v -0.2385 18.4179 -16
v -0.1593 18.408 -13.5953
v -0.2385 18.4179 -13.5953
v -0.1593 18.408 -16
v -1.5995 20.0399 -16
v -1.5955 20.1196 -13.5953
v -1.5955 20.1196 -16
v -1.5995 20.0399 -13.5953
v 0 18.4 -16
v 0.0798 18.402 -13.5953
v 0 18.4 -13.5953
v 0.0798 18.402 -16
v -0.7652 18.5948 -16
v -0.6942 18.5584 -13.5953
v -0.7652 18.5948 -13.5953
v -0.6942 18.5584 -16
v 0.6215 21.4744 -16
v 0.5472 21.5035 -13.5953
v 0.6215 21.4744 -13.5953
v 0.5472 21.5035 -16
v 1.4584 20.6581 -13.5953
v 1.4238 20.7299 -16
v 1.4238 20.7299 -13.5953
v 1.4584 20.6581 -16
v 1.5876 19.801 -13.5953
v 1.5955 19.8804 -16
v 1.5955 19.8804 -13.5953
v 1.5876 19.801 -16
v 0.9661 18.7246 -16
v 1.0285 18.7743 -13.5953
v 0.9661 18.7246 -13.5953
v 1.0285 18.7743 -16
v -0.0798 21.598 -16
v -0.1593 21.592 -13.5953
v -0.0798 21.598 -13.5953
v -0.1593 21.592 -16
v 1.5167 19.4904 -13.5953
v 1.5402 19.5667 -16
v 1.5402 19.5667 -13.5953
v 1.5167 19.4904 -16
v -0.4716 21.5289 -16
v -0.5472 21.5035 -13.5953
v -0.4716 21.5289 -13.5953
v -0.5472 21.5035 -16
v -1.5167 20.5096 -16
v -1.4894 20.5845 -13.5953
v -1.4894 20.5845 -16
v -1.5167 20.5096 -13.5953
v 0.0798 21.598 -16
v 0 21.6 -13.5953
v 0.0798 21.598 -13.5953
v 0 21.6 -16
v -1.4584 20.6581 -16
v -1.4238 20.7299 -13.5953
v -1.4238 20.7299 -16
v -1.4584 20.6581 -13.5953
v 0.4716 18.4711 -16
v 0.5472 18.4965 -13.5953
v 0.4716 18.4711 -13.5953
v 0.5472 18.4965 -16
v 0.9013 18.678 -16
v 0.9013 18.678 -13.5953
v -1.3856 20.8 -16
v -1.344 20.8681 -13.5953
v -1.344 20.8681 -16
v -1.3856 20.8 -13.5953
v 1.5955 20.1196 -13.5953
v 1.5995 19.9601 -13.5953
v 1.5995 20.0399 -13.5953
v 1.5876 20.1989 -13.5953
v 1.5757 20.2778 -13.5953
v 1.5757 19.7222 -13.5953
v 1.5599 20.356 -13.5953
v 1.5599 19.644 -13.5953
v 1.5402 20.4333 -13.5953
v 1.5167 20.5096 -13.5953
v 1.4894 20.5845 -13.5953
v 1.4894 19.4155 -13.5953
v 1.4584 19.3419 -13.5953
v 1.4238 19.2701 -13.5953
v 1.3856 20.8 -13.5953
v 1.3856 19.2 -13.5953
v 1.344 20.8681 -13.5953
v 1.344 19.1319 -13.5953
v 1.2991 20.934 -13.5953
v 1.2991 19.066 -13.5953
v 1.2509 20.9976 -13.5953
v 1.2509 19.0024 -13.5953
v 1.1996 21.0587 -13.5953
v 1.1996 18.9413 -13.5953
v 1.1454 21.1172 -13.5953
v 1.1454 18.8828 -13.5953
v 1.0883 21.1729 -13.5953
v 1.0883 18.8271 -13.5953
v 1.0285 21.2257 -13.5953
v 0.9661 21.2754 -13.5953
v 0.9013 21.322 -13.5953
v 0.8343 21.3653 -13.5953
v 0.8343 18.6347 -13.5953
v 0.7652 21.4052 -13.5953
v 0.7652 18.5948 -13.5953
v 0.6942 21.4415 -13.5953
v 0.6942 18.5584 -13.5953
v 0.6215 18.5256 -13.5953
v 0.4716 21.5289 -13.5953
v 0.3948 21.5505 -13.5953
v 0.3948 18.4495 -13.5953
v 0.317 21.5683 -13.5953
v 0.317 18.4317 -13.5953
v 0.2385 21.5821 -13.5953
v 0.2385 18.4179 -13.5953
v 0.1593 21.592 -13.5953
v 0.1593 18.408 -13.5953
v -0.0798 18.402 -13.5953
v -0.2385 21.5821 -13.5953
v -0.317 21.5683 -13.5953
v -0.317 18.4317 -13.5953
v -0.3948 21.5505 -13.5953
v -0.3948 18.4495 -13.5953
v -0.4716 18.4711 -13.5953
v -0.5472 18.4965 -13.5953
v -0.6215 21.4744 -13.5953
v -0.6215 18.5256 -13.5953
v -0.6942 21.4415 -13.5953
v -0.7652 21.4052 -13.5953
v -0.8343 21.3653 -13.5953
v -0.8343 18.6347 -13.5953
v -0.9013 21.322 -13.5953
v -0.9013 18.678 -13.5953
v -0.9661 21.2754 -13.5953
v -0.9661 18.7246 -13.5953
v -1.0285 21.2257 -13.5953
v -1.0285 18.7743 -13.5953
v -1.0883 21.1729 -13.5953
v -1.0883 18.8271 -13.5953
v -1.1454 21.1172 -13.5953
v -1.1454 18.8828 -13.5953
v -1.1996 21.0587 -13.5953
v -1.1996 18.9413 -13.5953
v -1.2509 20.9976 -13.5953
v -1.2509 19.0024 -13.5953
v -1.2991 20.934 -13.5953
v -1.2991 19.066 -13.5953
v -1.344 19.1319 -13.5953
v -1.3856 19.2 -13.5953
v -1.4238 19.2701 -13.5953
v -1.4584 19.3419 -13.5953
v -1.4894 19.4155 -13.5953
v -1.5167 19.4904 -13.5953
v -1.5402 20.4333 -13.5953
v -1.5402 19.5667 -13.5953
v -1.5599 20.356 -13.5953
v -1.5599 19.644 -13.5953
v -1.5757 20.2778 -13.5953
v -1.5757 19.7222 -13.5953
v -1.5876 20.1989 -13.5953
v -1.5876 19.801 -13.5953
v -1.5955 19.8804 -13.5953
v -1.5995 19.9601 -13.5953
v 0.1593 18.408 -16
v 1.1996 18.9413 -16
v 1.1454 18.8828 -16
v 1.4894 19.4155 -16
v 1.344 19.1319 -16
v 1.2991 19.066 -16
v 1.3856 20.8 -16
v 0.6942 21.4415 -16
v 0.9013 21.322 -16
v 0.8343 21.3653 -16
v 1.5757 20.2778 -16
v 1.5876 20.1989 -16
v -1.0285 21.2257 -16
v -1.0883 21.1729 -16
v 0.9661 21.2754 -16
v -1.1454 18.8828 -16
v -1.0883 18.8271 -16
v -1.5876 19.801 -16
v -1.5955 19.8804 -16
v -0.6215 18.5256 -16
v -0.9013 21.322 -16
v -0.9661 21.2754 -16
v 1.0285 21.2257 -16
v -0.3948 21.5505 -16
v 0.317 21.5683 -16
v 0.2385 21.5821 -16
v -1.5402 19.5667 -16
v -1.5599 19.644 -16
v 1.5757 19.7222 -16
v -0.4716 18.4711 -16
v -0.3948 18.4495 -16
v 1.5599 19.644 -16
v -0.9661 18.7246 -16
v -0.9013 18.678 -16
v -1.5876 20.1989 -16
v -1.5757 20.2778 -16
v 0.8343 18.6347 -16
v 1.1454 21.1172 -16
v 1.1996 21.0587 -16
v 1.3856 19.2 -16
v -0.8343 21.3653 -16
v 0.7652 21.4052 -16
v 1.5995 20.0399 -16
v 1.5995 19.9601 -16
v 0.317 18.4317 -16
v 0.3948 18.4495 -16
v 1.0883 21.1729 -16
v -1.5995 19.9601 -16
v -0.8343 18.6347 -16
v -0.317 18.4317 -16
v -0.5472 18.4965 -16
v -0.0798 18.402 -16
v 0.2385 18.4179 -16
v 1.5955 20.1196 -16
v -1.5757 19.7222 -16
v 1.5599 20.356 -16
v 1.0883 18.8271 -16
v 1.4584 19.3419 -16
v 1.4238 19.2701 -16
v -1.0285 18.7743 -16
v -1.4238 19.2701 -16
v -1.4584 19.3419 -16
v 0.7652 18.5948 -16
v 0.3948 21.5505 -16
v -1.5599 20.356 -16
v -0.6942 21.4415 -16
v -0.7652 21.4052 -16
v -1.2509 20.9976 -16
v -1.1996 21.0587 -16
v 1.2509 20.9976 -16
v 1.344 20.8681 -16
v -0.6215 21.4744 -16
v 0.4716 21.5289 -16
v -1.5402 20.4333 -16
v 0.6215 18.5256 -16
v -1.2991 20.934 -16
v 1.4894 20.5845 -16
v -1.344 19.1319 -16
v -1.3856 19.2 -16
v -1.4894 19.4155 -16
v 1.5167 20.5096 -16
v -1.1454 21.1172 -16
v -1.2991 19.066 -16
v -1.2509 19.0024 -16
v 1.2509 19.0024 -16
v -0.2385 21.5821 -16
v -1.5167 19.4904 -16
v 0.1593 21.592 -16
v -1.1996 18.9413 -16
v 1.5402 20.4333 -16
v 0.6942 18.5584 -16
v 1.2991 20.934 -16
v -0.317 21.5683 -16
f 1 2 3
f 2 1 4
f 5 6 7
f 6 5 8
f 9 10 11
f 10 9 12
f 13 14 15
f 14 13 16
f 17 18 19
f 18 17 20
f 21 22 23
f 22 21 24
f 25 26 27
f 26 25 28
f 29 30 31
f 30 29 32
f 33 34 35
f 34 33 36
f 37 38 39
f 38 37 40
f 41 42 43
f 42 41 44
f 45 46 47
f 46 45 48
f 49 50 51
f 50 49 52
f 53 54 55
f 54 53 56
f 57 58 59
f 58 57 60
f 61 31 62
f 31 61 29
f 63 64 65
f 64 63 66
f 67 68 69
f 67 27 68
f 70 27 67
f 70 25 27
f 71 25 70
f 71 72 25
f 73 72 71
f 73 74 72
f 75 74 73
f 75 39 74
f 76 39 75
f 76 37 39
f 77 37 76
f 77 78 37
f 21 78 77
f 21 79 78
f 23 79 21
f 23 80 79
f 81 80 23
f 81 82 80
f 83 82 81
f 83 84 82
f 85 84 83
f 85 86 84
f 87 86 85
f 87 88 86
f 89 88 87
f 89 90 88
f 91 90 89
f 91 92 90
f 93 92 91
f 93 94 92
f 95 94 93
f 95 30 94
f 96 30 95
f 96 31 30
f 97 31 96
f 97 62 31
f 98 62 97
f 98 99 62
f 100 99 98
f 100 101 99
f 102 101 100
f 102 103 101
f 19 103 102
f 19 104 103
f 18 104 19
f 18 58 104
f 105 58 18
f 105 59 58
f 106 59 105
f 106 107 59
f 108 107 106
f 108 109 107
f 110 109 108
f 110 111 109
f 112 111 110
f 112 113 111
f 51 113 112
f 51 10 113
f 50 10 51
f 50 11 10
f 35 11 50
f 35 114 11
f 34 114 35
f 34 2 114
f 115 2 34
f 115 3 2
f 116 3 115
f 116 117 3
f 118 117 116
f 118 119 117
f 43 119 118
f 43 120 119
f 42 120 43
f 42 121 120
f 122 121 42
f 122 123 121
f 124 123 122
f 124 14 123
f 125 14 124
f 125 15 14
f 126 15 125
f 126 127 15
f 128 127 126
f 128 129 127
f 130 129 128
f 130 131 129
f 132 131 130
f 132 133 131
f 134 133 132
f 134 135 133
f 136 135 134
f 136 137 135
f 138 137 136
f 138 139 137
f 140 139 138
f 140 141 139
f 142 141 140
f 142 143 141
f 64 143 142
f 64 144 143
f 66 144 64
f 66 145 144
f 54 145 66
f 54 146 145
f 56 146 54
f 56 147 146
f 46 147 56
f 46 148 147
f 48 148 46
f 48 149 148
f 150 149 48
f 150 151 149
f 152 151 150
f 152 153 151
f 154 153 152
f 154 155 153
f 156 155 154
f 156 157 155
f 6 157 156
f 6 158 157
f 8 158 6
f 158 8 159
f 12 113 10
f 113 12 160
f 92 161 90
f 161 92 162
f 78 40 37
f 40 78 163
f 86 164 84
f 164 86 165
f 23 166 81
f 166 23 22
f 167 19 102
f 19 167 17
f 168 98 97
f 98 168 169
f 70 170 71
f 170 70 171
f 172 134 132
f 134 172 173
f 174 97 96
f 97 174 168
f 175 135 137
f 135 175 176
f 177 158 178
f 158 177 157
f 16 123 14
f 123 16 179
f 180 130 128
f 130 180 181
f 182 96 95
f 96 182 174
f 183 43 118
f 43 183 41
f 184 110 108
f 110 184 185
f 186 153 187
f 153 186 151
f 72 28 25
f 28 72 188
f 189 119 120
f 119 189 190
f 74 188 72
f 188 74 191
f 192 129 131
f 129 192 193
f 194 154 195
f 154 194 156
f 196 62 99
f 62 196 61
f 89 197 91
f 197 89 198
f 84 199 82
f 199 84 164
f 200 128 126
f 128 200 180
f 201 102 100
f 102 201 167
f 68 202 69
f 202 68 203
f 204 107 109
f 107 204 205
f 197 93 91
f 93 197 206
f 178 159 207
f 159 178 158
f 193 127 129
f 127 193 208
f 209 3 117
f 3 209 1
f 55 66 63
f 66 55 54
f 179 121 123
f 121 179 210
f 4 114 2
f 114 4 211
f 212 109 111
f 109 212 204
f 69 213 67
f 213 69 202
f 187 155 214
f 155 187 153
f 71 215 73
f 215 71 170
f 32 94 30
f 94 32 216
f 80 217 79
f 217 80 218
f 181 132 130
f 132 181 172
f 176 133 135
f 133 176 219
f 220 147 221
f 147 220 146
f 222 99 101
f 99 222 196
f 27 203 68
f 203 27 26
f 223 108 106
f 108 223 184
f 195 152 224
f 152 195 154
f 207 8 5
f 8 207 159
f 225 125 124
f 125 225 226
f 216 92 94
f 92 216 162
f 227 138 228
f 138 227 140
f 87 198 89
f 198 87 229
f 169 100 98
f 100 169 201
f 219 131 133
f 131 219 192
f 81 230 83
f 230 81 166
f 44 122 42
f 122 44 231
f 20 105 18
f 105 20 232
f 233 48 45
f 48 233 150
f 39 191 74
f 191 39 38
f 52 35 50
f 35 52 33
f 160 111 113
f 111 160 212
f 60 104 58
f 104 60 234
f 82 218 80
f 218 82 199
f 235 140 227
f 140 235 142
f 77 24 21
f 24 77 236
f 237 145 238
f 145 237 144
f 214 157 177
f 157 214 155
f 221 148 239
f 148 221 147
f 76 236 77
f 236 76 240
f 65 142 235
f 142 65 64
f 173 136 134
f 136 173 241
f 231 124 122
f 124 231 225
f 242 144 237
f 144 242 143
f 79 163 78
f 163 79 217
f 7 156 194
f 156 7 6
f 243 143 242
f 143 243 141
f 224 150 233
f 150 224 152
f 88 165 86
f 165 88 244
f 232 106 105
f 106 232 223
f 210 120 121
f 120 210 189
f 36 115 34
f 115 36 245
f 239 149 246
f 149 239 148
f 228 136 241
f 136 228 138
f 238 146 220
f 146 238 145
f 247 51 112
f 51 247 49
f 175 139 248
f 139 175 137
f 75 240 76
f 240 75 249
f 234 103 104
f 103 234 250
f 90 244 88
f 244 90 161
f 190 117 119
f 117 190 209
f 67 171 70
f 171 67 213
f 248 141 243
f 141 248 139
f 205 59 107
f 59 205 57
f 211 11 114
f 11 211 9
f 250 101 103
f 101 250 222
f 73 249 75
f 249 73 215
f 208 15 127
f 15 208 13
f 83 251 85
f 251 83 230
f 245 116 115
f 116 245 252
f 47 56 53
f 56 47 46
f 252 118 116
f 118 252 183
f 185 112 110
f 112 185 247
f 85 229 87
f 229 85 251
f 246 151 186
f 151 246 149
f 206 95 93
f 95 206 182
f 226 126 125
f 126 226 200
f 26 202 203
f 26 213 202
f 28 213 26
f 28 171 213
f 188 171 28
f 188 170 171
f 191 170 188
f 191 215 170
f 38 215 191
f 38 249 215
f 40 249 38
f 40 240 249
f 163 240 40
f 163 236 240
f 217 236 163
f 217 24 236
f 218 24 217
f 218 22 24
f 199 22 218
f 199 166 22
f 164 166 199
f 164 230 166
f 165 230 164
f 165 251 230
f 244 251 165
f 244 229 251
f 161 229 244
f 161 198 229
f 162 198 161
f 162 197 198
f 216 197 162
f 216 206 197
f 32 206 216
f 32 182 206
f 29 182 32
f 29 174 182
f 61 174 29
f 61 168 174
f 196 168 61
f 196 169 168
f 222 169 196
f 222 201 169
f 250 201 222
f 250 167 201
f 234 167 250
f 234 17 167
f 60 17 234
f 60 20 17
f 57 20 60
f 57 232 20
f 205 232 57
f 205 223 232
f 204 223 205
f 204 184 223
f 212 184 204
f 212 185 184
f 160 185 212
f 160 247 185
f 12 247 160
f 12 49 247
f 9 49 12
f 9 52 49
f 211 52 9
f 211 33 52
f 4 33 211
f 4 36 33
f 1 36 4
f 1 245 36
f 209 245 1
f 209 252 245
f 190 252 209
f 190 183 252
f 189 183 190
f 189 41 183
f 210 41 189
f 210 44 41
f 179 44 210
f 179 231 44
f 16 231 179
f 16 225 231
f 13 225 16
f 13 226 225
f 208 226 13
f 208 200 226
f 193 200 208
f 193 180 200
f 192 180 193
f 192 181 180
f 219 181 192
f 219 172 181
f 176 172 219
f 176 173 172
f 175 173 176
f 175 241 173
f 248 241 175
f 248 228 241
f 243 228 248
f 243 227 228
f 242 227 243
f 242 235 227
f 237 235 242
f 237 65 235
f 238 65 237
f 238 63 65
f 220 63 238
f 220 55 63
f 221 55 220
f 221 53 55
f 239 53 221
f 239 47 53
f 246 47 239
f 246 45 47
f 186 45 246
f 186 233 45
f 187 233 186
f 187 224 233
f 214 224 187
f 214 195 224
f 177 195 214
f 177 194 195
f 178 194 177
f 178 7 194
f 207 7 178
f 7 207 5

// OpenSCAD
use <../lib.scad>
use <../p/2-4cylo.scad>
use <../p/2-4ndis.scad>
use <../p/4-4cylo.scad>
use <../p/4-4ndis.scad>
use <../p/box.scad>
use <../p/box5.scad>
use <../p/rect3.scad>
use <s/u9373s01.scad>
$fa=1; $fs=0.2;
function ldraw_lib__u9373(realsolid=false) = [
// 0 ~Electric Technic Motor Back with Centre Pin Hole
// 0 Name: u9373.dat
// 0 Author: Chris Dee [cwdee]
// 0 !LDRAW_ORG Part UPDATE 2020-03
// 0 !LICENSE Licensed under CC BY 2.0 and CC BY 4.0 : see CAreadme.txt
// 
// 0 BFC CERTIFY CCW
  [0,"BFC","CERTIFY"],
  [0,"BFC","CCW"],
// 
// 0 !KEYWORDS 12V, 4.5V, Stator
// 
// 0 !HISTORY 2000-09-30 [PTadmin] Official Update 2000-02
// 0 !HISTORY 2007-09-10 [PTadmin] Header formatted for Contributor Agreement
// 0 !HISTORY 2008-07-01 [PTadmin] Official Update 2008-01
// 0 !HISTORY 2013-04-09 [MagFors] bfc'd, removed t-junctions
// 0 !HISTORY 2018-03-31 [MagFors] renamed from s/6216mb, subfiled for parts with/without centre hole
// 0 !HISTORY 2020-12-29 [PTadmin] Official Update 2020-03
// 
// 
// 1 16 0 0 0 1 0 0 0 1 0 0 0 1 s\u9373s01.dat
  [1,16,0,0,0,1,0,0,0,1,0,0,0,1, ldraw_lib__s__u9373s01(realsolid)],
// 
// 0 // top hole
// 1 16 0 17.5 40 4 0 0 0 0 1.5 0 -1 0 rect3.dat
  [1,16,0,17.5,40,4,0,0,0,0,1.5,0,-1,0, ldraw_lib__rect3(realsolid)],
// 0 BFC INVERTNEXT
  [0,"BFC","INVERTNEXT"],
// 1 16 0 19 50 4 0 0 0 -3 0 0 0 4 2-4cylo.dat
  [1,16,0,19,50,4,0,0,0,-3,0,0,0,4, ldraw_lib__2_4cylo(realsolid)],
// 1 16 4 17.5 45 0 1 0 1.5 0 0 0 0 -5 rect3.dat
  [1,16,4,17.5,45,0,1,0,1.5,0,0,0,0,-5, ldraw_lib__rect3(realsolid)],
// 1 16 -4 17.5 45 0 -1 0 -1.5 0 0 0 0 -5 rect3.dat
  [1,16,-4,17.5,45,0,-1,0,-1.5,0,0,0,0,-5, ldraw_lib__rect3(realsolid)],
// 1 16 0 19 50 4 0 0 0 -1 0 0 0 4 2-4ndis.dat
  [1,16,0,19,50,4,0,0,0,-1,0,0,0,4, ldraw_lib__2_4ndis(realsolid)],
// 1 16 0 16 50 4 0 0 0 1 0 0 0 4 2-4ndis.dat
  [1,16,0,16,50,4,0,0,0,1,0,0,0,4, ldraw_lib__2_4ndis(realsolid)],
// 4 16 4 19 40 4 19 54 6 19 54 6 19 46
  [4,16,4,19,40,4,19,54,6,19,54,6,19,46],
// 4 16 -6 19 46 -6 19 54 -4 19 54 -4 19 40
  [4,16,-6,19,46,-6,19,54,-4,19,54,-4,19,40],
// 4 16 4 16 54 4 16 56 -4 16 56 -4 16 54
  [4,16,4,16,54,4,16,56,-4,16,56,-4,16,54],
// 
// 0 // rear hole
// 0 BFC INVERTNEXT
  [0,"BFC","INVERTNEXT"],
// 1 16 0 25 56 4 0 0 0 0 -4 0 4 0 4-4cylo.dat
  [1,16,0,25,56,4,0,0,0,0,-4,0,4,0, ldraw_lib__4_4cylo(realsolid)],
// 1 16 0 25 56 4 0 0 0 0 -4 0 1 0 4-4ndis.dat
  [1,16,0,25,56,4,0,0,0,0,-4,0,1,0, ldraw_lib__4_4ndis(realsolid)],
// 1 16 0 25 60 4 0 0 0 0 -4 0 -1 0 4-4ndis.dat
  [1,16,0,25,60,4,0,0,0,0,-4,0,-1,0, ldraw_lib__4_4ndis(realsolid)],
// 
// 0 // vision blocker
// 1 0 0 25 40 0 0 16 -6 0 0 0 -2 0 box.dat
  [1,0,0,25,40,0,0,16,-6,0,0,0,-2,0, ldraw_lib__box(realsolid)],
// 
// 0 // contact plates
// 1 494 13.75 25 42 0 0 -0.25 -5.5 0 0 0 14 0 box5.dat
  [1,494,13.75,25,42,0,0,-0.25,-5.5,0,0,0,14,0, ldraw_lib__box5(realsolid)],
// 1 494 6.25 25 42 0 0 -0.25 -5.5 0 0 0 14 0 box5.dat
  [1,494,6.25,25,42,0,0,-0.25,-5.5,0,0,0,14,0, ldraw_lib__box5(realsolid)],
// 1 494 -6.25 25 42 0 0 -0.25 -5.5 0 0 0 14 0 box5.dat
  [1,494,-6.25,25,42,0,0,-0.25,-5.5,0,0,0,14,0, ldraw_lib__box5(realsolid)],
// 1 494 -13.75 25 42 0 0 -0.25 -5.5 0 0 0 14 0 box5.dat
  [1,494,-13.75,25,42,0,0,-0.25,-5.5,0,0,0,14,0, ldraw_lib__box5(realsolid)],
];
module ldraw_lib__u9373(step=0, col=false, unit=2/5, alt=false, line=0.2, solid=!$preview)
    makepoly(ldraw_lib__u9373(solid), step=step, col=col, unit=unit, alt=alt, line=line, solid=solid);
ldraw_lib__u9373(line=0.2);
